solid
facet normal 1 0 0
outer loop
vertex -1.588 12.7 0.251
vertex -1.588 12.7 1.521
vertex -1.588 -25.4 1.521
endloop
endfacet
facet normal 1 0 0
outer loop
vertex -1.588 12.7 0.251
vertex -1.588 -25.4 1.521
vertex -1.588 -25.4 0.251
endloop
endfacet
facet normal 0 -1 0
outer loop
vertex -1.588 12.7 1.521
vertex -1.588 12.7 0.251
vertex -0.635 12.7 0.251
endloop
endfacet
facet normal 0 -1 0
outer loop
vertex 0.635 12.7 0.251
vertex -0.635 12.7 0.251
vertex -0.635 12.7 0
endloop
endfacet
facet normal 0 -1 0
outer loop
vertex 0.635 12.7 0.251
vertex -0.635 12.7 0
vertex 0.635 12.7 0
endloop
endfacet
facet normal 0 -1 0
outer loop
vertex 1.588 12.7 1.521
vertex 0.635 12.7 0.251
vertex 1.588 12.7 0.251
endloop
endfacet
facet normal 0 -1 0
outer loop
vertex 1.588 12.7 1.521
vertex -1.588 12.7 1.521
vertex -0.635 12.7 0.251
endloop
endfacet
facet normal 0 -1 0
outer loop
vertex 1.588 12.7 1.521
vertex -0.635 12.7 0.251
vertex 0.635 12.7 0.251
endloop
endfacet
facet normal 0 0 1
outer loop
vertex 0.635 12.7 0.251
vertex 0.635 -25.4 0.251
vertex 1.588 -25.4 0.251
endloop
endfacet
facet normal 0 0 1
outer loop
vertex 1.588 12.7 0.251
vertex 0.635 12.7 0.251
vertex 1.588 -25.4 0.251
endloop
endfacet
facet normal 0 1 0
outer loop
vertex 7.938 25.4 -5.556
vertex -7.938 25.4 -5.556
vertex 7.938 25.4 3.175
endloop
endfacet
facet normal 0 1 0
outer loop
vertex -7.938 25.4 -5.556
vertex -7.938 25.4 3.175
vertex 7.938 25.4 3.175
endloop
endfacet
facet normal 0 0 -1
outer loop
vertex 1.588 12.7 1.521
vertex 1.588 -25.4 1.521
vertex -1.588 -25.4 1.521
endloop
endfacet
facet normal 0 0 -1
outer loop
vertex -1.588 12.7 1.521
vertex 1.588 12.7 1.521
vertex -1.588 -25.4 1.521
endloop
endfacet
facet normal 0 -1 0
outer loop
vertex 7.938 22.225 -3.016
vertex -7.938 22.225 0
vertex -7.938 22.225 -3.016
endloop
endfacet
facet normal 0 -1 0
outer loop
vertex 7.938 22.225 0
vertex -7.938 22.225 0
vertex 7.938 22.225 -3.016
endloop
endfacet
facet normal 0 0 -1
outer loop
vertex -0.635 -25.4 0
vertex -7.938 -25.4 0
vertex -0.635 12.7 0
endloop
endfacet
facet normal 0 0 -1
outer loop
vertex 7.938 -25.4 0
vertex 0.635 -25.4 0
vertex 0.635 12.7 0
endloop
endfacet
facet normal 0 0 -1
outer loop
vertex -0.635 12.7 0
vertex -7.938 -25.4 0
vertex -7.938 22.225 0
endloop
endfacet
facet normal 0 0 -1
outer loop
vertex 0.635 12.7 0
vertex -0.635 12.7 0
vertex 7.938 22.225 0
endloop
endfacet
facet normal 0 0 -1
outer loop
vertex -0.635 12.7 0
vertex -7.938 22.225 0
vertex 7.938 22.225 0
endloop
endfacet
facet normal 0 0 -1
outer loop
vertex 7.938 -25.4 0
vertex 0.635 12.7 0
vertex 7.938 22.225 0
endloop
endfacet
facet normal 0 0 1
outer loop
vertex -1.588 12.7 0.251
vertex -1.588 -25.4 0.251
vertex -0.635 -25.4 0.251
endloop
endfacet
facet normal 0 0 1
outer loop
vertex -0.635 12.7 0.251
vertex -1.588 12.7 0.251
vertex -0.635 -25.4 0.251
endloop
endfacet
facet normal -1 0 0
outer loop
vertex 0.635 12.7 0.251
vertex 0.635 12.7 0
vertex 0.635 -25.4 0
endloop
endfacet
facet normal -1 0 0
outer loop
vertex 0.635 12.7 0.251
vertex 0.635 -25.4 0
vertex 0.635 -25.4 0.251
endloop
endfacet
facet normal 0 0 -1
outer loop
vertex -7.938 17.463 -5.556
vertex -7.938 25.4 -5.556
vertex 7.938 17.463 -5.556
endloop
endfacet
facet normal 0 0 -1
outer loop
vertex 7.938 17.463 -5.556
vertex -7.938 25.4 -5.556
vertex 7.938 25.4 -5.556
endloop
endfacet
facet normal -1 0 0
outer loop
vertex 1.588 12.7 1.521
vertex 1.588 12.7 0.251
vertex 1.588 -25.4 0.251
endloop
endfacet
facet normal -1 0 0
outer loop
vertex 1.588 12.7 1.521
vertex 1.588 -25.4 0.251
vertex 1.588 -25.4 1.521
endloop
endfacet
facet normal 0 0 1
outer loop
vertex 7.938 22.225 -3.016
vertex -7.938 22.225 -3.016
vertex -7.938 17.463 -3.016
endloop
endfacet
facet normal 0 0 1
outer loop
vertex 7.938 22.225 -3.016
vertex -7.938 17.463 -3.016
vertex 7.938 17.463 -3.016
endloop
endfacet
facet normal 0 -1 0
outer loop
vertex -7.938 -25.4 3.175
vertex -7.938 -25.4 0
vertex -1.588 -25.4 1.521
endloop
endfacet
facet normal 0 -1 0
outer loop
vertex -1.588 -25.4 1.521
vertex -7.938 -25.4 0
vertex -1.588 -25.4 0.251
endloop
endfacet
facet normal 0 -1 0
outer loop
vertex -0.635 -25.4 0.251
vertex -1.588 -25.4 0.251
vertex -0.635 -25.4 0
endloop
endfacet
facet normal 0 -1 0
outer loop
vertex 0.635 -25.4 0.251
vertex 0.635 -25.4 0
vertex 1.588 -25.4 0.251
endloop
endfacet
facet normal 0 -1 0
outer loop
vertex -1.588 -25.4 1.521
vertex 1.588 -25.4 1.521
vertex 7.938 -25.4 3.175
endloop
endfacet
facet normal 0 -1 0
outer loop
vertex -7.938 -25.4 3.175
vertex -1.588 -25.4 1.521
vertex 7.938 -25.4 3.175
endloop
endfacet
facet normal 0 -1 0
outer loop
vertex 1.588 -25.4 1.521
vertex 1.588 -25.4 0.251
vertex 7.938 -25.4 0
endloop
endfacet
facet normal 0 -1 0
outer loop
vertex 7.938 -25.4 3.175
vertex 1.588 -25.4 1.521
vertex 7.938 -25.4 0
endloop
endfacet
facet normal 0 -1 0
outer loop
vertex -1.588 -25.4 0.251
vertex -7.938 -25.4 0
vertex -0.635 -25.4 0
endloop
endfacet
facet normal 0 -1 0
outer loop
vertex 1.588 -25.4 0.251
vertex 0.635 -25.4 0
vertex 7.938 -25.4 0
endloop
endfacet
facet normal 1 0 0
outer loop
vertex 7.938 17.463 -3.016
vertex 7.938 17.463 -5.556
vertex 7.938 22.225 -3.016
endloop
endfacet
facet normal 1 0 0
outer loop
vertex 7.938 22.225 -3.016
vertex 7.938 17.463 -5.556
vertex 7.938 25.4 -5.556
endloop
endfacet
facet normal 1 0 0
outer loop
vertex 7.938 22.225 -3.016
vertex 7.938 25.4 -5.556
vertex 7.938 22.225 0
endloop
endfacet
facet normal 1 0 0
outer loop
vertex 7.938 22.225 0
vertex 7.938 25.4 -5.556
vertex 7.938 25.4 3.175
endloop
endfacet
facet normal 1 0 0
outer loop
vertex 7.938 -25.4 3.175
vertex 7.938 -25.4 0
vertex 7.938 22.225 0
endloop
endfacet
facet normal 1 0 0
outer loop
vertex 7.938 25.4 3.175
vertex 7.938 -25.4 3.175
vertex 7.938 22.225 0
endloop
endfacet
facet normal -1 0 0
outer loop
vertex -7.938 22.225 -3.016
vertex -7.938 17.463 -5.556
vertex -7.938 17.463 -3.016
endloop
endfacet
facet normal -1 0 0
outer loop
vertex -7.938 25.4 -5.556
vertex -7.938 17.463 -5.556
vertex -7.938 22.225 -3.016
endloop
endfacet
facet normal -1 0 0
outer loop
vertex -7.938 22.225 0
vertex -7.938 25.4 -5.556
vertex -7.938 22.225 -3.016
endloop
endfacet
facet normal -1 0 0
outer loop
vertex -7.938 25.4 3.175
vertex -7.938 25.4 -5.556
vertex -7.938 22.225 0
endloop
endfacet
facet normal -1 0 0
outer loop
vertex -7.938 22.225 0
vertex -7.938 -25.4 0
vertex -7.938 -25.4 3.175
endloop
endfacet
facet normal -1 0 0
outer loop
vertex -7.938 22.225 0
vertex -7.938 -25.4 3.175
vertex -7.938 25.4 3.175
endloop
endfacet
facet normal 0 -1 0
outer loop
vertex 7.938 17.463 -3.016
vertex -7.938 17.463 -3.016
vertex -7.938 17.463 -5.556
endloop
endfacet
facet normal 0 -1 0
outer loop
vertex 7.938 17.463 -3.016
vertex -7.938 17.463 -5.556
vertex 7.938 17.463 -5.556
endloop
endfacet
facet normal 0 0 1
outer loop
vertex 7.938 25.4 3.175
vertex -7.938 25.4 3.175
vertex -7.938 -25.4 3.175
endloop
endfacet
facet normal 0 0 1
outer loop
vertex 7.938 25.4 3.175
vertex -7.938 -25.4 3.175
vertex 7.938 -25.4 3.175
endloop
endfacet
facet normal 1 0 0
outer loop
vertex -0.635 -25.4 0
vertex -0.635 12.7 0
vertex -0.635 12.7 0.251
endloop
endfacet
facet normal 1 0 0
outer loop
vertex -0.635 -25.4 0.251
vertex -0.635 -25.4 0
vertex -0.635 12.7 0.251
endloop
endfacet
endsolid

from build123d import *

# Parameters (mm, degrees)
F0_W     = 15.875
F0_H     = 50.8
F1_DEPTH = 3.175
F2_W     = 15.875
F2_H     = 3.175
F3_DEPTH = 5.55625
F4_W     = 15.875
F4_H     = 2.54
F5_DEPTH = 4.7625
F6_W     = 1.27
F6_H     = 0.2512368413
F7_DEPTH = 38.1


with BuildPart() as f1:
    # F0 (on Top) → F1 (new body)
    with BuildSketch(Plane.XY):
        Rectangle(F0_W, F0_H)
    extrude(amount=F1_DEPTH)

    # F2 (on face) → F3 (join)
    with BuildSketch(Plane(origin=(0, 0, 0), x_dir=(1, 0, 0), z_dir=(0, 0, -1))):
        with Locations((0, -23.8125)):
            Rectangle(F2_W, F2_H)
    extrude(amount=F3_DEPTH)

    # F4 (on face) → F5 (join)
    with BuildSketch(Plane.XZ.offset(-22.225)):
        with Locations((0, -4.28625)):
            Rectangle(F4_W, F4_H)
    extrude(amount=F5_DEPTH)

    # F6 (on face) → F7 (cut)
    with BuildSketch(Plane.XZ.offset(25.4)):
        Polygon((0.635, 0.2512368413), (1.5875, 0.2512368413), (1.5875, 1.5212368413), (-1.5875, 1.5212368413), (-1.5875, 0.2512368413), (-0.635, 0.2512368413), align=None)
        with Locations((0, 0.1256184207)):
            Rectangle(F6_W, F6_H)
    extrude(amount=-F7_DEPTH, mode=Mode.SUBTRACT)


solid = f1.part
